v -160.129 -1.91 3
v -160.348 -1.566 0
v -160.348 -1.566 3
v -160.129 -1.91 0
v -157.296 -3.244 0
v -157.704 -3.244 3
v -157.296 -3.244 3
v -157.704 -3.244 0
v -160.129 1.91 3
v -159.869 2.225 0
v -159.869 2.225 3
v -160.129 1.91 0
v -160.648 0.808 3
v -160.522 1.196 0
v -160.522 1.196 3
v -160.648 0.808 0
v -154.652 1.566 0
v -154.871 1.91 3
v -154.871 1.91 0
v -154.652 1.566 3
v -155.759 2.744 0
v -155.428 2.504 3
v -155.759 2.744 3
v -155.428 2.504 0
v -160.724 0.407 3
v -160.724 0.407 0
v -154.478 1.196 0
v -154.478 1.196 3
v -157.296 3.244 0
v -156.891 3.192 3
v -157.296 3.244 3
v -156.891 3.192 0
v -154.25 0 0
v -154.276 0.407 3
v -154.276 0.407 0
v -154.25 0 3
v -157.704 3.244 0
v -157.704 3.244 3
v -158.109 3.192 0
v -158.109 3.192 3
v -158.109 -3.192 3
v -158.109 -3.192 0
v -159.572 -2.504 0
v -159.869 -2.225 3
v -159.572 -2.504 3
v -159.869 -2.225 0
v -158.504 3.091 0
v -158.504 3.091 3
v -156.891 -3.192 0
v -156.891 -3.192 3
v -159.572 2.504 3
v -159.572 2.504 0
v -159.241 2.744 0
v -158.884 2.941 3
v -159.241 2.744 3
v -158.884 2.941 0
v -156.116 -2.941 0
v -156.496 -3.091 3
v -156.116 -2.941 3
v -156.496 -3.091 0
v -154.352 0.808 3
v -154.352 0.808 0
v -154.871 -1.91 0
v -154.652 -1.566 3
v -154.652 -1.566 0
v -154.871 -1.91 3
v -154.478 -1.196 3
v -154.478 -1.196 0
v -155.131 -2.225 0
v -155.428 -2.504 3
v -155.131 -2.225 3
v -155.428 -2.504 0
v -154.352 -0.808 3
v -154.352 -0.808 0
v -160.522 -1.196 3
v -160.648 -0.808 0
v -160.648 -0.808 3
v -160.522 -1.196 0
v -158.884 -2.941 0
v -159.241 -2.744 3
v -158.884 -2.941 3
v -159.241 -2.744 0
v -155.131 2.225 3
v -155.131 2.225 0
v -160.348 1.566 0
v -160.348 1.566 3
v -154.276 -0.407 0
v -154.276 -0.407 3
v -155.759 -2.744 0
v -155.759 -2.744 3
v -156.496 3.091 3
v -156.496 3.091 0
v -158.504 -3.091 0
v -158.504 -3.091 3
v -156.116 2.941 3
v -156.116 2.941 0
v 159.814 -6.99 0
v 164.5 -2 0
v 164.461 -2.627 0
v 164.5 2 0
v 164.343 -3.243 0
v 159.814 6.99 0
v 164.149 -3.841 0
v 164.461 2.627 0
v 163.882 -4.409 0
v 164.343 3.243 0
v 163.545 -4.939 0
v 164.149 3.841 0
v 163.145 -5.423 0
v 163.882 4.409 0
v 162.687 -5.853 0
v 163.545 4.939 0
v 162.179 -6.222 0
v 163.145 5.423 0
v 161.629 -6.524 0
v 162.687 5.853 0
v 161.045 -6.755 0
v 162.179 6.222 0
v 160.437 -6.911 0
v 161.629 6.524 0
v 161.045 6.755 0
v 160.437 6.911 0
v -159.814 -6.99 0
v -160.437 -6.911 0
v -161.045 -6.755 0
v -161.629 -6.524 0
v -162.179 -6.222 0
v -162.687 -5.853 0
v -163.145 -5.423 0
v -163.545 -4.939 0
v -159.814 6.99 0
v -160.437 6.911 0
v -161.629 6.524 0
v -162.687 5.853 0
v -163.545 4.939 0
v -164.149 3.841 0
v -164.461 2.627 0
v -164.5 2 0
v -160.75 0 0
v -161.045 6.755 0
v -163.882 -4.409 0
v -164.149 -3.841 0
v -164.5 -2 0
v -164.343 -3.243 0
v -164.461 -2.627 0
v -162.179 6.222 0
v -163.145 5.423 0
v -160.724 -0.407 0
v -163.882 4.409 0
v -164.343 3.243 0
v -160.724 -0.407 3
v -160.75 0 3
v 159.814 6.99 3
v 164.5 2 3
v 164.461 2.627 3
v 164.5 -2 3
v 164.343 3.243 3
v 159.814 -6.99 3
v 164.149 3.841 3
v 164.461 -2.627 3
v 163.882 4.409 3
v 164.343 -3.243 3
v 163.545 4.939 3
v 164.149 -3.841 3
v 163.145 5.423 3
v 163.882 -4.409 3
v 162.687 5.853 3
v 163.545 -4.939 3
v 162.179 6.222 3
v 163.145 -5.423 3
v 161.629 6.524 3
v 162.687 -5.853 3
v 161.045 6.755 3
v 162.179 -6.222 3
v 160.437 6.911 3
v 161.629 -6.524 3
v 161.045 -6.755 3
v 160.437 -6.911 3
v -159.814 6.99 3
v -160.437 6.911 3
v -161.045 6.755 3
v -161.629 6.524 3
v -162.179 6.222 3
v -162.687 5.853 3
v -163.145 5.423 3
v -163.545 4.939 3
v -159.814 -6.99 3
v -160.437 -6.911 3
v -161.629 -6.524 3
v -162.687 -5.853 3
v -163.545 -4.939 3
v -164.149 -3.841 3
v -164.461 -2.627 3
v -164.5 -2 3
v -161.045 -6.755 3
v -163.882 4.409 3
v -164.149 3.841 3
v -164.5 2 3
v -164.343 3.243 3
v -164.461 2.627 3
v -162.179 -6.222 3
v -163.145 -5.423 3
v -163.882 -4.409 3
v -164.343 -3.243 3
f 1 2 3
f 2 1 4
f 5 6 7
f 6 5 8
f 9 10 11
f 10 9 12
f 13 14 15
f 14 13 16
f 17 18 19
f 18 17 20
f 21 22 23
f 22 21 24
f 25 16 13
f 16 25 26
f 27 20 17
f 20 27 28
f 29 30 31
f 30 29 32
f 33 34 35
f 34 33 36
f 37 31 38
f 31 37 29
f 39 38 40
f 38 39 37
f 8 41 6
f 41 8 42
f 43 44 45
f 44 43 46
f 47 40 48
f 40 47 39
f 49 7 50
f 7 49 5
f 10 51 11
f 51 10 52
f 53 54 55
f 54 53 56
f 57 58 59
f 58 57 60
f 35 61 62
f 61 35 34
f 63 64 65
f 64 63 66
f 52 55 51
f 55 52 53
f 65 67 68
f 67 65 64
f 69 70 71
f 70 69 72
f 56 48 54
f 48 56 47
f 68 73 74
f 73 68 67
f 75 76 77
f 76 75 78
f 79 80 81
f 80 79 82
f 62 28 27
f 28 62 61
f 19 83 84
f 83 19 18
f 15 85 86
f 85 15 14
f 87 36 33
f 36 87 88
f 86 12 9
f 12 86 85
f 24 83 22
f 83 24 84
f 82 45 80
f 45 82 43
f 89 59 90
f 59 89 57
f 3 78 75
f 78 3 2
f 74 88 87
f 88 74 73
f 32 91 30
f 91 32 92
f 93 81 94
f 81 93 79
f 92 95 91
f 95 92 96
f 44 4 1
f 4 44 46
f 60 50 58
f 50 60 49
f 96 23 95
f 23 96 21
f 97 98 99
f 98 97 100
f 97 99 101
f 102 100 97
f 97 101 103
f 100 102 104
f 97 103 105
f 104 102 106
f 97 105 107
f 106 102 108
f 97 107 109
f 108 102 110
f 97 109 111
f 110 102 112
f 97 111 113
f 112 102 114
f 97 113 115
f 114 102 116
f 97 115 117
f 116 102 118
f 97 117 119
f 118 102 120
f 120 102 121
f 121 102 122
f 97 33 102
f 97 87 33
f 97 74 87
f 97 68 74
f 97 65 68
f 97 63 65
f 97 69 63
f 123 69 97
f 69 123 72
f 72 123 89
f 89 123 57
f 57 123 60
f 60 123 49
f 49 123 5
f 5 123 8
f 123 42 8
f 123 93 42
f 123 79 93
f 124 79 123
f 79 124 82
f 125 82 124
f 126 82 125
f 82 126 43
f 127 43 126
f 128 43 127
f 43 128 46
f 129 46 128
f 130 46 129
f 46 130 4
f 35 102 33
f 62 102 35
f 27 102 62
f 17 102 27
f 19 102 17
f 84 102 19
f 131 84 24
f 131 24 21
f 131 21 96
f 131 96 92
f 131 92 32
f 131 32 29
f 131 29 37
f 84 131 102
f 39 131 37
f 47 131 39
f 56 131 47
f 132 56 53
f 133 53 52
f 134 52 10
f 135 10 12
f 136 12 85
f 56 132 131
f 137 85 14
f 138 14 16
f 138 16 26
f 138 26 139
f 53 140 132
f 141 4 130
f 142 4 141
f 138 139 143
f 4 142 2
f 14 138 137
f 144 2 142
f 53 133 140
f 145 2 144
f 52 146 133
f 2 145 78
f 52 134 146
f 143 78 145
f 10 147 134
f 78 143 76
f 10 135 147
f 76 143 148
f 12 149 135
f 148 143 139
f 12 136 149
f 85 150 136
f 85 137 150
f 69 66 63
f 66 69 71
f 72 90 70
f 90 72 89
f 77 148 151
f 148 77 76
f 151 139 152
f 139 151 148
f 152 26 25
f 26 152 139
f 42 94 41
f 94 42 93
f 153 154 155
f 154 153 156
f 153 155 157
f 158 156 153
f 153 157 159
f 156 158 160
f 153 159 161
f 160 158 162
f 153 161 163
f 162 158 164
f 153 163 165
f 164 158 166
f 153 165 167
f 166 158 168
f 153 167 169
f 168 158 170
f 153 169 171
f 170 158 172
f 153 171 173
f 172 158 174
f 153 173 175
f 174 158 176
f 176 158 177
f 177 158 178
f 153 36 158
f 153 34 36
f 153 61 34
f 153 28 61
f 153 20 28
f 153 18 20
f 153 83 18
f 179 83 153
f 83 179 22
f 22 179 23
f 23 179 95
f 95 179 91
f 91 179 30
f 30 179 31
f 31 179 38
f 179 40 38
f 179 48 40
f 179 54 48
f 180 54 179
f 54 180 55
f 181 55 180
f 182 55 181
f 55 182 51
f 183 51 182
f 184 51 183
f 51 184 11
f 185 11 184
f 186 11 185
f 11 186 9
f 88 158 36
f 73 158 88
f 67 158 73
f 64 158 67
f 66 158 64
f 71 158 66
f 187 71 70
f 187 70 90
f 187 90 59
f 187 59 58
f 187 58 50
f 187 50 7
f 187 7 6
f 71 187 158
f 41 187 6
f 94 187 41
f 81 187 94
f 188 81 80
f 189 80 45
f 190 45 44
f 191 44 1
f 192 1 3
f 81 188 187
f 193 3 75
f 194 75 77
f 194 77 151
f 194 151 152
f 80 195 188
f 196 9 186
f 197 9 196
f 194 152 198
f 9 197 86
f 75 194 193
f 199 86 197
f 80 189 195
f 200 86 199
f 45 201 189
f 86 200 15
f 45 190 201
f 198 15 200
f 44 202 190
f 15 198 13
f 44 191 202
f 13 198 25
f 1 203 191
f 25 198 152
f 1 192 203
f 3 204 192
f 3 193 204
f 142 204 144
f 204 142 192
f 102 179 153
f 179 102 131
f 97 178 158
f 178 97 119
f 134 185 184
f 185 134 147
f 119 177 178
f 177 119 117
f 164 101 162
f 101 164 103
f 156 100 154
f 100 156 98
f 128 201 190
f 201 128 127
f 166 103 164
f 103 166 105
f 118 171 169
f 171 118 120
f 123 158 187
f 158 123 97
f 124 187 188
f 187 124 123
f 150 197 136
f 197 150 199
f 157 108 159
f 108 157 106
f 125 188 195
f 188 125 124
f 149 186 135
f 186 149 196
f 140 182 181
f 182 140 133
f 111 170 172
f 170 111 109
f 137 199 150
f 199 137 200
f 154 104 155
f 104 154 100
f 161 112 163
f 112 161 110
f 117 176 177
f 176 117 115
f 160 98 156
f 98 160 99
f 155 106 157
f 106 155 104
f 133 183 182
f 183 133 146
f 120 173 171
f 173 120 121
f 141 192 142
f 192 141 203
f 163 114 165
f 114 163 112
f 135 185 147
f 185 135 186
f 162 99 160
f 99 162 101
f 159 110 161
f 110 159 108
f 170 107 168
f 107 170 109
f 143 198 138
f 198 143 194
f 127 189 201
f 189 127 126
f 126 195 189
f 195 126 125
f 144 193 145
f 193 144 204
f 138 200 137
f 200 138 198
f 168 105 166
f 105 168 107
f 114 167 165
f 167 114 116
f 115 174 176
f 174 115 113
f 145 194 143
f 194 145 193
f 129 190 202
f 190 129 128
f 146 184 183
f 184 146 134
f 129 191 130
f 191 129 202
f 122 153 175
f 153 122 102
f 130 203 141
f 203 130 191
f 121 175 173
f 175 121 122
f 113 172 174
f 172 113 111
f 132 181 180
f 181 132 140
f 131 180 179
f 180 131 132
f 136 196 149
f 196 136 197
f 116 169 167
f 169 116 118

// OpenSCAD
$fn = 50;


difference() {
	union() {
		hull() {
			translate(v = [-159.5000000000, 2.0000000000, 0]) {
				cylinder(h = 3, r = 5);
			}
			translate(v = [159.5000000000, 2.0000000000, 0]) {
				cylinder(h = 3, r = 5);
			}
			translate(v = [-159.5000000000, -2.0000000000, 0]) {
				cylinder(h = 3, r = 5);
			}
			translate(v = [159.5000000000, -2.0000000000, 0]) {
				cylinder(h = 3, r = 5);
			}
		}
	}
	union() {
		translate(v = [-157.5000000000, 0.0000000000, 0]) {
			cylinder(h = 3, r = 3.2500000000);
		}
		translate(v = [-157.5000000000, 0.0000000000, 0]) {
			cylinder(h = 3, r = 1.8000000000);
		}
		translate(v = [-157.5000000000, 0.0000000000, 0]) {
			cylinder(h = 3, r = 1.8000000000);
		}
		translate(v = [-157.5000000000, 0.0000000000, 0]) {
			cylinder(h = 3, r = 1.8000000000);
		}
	}
}
